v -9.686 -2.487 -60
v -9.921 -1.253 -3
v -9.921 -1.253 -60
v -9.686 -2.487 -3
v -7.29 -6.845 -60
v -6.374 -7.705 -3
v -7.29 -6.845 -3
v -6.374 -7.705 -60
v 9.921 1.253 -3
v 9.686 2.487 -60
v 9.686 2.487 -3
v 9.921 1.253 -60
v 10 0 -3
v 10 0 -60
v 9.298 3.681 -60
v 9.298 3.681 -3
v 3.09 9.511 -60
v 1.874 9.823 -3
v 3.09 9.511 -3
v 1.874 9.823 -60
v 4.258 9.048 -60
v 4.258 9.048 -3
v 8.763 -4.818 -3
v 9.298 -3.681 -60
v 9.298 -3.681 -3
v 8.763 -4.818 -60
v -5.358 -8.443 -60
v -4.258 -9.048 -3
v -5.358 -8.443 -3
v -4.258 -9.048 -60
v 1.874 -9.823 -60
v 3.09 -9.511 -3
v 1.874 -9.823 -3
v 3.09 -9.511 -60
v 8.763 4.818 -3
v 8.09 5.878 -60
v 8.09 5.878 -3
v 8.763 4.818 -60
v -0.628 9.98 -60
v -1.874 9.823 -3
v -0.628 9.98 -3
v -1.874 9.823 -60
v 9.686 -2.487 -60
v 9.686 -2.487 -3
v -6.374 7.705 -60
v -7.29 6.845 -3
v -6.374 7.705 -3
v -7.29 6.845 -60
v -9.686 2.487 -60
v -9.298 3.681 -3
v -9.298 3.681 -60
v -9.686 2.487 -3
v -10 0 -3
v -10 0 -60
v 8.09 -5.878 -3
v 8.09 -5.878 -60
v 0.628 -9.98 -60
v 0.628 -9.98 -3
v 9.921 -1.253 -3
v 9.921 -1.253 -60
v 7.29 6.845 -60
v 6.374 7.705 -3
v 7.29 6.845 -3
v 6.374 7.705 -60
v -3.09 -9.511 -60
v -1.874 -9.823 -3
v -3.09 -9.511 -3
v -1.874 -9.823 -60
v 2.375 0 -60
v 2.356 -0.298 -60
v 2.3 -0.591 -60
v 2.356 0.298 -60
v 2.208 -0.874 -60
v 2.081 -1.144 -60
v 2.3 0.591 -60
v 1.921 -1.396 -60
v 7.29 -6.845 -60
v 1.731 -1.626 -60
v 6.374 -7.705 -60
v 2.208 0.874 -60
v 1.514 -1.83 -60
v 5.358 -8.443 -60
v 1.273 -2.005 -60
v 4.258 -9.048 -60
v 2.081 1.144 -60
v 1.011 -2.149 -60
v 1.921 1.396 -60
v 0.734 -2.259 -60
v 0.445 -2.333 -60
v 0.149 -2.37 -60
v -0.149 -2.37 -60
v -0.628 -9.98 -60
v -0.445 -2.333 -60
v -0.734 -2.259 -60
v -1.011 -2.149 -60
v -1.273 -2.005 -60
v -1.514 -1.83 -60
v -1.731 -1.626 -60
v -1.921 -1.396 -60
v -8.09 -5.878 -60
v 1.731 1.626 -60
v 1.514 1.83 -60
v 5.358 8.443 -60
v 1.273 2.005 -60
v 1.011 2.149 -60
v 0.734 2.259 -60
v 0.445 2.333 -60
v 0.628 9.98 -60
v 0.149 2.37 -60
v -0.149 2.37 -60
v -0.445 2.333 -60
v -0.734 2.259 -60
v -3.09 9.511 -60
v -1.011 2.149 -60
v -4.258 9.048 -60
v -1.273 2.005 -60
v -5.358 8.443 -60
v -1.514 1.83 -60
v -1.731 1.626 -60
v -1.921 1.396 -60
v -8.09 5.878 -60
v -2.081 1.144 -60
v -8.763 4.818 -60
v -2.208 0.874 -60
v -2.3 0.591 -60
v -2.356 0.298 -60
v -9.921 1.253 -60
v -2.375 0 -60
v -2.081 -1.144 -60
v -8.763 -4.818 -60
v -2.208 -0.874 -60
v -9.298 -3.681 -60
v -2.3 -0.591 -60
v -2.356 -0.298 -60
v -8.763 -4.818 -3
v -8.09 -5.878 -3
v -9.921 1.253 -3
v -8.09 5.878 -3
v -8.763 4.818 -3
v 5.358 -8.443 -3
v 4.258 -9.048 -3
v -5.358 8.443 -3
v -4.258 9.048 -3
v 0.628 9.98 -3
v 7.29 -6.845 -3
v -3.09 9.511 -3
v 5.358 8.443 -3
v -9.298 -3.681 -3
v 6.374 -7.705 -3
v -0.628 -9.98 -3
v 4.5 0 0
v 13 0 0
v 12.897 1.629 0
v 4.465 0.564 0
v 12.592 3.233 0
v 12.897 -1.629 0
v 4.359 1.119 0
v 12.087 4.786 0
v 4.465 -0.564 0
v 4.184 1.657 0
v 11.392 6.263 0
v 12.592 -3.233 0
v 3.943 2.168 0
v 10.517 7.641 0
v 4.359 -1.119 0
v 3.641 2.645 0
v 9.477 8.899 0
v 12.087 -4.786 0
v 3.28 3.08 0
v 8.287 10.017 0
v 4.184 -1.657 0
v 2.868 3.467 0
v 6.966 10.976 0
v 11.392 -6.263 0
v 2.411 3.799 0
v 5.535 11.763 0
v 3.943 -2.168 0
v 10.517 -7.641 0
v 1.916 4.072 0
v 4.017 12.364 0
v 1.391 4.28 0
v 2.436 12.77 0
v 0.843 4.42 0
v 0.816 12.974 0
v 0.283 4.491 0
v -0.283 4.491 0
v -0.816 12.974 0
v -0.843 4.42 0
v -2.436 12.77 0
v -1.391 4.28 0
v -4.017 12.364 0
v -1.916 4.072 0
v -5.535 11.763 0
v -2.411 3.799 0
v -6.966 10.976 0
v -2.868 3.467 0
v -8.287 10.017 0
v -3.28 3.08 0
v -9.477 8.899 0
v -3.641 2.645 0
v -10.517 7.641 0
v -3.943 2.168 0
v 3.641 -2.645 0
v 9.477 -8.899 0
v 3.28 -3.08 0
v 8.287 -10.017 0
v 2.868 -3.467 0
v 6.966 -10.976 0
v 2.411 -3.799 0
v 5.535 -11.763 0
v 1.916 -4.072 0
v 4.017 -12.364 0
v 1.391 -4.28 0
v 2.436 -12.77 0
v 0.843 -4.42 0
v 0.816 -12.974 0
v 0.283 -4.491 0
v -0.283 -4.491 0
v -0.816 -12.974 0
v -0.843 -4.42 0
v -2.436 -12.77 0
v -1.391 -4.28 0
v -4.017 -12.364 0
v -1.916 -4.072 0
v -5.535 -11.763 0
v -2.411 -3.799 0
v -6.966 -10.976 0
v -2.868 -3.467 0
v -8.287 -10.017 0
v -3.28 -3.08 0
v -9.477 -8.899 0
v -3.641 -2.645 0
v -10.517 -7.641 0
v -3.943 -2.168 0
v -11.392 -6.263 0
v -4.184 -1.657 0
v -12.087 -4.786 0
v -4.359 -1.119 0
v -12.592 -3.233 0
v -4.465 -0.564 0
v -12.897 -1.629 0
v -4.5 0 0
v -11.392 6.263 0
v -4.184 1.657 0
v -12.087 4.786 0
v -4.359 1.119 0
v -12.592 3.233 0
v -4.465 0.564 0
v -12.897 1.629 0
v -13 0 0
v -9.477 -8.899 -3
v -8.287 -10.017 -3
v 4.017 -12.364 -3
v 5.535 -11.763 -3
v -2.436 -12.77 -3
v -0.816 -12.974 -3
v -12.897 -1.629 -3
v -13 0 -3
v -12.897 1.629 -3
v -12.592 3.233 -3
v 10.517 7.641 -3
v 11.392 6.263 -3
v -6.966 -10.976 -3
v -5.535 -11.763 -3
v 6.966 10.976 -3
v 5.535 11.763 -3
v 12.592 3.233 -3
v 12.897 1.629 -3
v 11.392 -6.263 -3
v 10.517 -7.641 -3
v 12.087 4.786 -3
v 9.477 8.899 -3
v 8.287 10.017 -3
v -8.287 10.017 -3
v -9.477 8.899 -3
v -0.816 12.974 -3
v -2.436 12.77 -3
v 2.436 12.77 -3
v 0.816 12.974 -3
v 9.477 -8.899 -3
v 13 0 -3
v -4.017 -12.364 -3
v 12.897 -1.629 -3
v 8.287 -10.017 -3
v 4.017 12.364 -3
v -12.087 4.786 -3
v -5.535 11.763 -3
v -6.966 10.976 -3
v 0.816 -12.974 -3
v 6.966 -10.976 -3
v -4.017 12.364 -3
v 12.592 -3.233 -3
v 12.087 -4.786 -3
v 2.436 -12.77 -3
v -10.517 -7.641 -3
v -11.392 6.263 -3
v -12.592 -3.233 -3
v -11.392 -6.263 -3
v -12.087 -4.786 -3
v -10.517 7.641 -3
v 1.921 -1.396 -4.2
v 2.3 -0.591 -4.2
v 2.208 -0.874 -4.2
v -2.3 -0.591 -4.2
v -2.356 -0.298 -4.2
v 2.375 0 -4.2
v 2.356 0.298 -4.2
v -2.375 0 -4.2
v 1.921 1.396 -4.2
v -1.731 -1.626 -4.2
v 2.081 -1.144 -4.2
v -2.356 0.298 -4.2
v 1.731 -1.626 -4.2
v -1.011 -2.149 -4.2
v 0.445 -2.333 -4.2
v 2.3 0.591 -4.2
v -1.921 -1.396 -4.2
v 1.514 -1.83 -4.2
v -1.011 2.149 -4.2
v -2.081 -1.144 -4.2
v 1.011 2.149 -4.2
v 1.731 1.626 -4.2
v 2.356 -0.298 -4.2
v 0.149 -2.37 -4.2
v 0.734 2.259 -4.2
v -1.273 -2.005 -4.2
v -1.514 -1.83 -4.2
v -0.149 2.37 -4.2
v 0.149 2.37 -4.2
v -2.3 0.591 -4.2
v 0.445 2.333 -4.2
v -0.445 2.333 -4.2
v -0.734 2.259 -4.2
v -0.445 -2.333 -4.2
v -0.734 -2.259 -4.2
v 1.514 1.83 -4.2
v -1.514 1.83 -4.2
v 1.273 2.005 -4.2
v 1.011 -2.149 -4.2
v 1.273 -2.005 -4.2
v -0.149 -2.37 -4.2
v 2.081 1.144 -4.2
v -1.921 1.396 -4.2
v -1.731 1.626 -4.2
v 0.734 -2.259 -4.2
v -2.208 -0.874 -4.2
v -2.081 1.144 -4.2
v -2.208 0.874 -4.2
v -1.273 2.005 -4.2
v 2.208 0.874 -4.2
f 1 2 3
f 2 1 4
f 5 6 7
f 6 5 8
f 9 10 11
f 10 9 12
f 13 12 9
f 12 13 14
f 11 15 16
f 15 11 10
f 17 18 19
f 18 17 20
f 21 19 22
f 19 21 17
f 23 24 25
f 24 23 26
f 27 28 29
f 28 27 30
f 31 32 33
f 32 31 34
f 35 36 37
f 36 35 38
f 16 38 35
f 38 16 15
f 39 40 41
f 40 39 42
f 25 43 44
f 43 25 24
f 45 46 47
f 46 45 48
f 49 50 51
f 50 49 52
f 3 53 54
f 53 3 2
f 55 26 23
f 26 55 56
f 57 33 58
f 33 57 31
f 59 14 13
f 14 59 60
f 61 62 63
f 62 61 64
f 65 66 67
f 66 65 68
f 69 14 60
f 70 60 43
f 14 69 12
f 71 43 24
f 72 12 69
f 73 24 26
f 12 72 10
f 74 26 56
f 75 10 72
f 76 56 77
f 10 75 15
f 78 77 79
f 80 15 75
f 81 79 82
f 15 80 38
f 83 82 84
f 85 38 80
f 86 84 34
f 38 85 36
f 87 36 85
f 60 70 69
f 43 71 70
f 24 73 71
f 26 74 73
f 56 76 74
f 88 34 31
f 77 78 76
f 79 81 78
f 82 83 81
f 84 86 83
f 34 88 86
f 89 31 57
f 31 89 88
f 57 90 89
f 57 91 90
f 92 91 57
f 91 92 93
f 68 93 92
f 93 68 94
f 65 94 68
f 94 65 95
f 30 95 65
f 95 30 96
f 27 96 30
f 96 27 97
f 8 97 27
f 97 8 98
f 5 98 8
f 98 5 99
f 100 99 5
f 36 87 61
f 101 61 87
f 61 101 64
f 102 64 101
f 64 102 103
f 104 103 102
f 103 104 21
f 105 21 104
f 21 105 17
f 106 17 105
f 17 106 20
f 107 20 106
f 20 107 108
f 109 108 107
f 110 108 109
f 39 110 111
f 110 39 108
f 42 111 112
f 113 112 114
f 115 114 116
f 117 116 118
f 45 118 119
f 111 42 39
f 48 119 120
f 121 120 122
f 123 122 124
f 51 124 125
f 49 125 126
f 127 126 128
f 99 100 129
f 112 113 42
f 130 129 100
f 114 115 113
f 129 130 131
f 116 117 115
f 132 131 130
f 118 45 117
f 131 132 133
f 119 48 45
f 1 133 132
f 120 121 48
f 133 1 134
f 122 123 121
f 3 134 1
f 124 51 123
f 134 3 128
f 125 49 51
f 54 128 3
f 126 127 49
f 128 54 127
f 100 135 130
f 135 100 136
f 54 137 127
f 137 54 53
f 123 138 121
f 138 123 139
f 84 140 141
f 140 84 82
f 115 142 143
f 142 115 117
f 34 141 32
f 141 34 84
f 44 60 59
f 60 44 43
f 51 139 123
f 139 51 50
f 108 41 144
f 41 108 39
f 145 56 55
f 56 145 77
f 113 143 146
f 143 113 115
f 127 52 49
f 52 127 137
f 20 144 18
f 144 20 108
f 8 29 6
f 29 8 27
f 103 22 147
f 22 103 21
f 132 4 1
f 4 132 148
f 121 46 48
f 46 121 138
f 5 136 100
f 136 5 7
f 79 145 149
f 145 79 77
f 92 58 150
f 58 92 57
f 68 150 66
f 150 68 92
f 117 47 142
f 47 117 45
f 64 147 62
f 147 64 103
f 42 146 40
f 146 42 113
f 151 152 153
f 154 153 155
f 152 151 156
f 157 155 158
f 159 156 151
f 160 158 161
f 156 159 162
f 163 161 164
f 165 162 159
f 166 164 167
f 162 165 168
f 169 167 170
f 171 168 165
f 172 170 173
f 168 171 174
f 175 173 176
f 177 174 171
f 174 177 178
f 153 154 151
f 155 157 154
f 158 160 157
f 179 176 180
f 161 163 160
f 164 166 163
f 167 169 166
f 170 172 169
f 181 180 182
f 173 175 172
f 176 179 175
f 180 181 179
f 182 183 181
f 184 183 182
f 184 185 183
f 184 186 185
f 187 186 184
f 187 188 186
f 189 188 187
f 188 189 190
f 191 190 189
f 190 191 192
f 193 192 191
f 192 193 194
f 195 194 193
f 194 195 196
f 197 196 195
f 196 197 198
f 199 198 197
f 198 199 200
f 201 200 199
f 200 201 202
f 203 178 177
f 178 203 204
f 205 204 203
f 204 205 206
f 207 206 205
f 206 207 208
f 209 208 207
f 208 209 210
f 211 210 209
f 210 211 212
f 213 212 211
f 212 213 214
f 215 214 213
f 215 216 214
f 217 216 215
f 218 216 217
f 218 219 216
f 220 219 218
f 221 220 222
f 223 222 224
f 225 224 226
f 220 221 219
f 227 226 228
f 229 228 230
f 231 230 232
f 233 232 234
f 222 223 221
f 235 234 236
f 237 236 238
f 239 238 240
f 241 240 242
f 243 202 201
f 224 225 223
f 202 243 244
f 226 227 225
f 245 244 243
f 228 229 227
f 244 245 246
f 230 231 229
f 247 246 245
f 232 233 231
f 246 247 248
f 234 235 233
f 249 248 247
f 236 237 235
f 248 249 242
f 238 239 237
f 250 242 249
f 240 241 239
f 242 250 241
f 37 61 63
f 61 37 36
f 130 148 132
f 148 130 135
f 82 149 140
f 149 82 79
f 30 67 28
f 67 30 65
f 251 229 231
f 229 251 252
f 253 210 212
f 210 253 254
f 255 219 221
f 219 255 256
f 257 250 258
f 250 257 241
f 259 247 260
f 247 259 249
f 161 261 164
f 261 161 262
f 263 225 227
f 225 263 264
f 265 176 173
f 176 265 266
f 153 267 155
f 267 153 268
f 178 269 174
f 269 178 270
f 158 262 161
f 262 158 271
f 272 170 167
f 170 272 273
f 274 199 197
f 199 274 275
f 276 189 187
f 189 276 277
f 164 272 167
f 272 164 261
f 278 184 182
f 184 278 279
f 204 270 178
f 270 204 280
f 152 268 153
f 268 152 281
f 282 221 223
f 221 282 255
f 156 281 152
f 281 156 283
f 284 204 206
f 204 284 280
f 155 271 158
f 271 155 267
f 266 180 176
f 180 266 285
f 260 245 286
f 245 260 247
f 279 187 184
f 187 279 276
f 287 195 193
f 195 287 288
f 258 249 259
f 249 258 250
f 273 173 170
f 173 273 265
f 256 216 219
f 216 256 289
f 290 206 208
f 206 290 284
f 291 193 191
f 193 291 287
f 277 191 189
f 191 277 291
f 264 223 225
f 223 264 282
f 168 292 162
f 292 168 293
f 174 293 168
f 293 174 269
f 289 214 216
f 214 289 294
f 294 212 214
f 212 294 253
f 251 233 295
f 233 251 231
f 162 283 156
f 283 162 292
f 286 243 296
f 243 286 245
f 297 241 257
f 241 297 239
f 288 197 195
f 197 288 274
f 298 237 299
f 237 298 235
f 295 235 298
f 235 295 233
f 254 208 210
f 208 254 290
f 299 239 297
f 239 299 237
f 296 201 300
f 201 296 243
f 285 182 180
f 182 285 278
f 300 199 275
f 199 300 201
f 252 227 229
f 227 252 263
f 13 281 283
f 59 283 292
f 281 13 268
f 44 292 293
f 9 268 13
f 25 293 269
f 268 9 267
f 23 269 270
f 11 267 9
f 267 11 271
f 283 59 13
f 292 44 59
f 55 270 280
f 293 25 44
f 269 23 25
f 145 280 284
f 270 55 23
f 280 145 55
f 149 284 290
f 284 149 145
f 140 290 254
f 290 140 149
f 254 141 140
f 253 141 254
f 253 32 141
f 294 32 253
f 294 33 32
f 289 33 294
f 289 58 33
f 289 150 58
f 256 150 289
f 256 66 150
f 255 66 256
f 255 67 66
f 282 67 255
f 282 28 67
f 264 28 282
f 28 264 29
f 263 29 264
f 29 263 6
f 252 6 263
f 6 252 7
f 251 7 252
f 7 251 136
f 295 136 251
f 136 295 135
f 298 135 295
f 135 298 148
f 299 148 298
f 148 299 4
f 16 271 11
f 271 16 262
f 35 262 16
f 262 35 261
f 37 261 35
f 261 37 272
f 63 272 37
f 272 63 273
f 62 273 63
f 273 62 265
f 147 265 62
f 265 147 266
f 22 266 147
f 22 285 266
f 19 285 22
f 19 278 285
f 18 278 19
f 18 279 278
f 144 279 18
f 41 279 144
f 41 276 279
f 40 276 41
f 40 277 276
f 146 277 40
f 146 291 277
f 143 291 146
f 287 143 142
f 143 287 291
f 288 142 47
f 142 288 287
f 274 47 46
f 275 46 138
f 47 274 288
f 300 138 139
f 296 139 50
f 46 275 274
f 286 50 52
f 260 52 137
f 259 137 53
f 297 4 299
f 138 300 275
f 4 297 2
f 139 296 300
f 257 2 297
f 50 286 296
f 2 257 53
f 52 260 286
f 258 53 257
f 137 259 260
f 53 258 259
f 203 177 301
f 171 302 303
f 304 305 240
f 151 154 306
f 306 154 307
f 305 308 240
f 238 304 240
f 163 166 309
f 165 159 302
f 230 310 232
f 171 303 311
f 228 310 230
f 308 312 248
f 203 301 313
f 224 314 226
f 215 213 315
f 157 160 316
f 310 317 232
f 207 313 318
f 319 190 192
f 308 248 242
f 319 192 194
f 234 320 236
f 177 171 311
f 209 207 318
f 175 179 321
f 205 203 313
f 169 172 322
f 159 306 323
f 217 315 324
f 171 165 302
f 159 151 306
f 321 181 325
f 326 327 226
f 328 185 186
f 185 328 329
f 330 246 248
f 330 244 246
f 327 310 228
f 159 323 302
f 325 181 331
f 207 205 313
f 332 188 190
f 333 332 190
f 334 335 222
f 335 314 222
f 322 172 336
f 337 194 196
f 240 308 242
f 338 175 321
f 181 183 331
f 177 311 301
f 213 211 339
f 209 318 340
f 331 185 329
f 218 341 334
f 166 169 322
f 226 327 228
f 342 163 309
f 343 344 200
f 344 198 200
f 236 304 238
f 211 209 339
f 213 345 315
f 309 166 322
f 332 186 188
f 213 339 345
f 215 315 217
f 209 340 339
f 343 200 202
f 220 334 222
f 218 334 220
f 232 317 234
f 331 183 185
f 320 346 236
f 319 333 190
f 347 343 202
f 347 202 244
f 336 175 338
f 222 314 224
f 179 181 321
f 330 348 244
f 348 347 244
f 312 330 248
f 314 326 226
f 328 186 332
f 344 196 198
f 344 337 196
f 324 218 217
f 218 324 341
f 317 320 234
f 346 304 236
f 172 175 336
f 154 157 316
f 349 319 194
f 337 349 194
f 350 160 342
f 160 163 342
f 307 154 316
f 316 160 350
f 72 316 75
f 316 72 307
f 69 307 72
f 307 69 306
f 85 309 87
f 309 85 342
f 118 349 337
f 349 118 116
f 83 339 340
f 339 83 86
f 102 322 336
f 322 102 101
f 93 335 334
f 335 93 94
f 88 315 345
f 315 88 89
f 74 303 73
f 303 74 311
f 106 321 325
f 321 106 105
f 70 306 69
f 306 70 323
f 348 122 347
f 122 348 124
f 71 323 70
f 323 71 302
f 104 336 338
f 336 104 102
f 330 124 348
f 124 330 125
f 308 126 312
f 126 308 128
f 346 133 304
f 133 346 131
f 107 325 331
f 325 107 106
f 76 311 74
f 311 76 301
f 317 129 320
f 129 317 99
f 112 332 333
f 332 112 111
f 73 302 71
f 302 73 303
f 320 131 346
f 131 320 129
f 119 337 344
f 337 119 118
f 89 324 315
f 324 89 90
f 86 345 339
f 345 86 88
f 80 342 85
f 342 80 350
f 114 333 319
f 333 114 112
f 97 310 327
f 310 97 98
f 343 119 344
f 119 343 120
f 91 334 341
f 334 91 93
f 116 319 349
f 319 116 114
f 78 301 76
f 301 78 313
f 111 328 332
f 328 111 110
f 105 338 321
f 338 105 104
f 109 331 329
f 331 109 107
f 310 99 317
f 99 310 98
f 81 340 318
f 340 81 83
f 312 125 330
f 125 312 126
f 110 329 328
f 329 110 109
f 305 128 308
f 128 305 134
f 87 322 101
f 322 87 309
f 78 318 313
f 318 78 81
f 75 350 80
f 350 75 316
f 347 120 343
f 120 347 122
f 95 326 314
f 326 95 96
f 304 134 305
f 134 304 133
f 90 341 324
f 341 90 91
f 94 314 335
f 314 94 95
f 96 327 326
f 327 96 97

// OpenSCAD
$fn = 50;


difference() {
	union() {
		translate(v = [0, 0, -60.0000000000]) {
			cylinder(h = 60, r = 10.0000000000);
		}
		translate(v = [0, 0, -3.0000000000]) {
			cylinder(h = 3, r = 13.0000000000);
		}
	}
	union() {
		translate(v = [0, 0, 0]) {
			rotate(a = [0, 0, 0]) {
				difference() {
					union() {
						#translate(v = [0, 0, -60.0000000000]) {
							cylinder(h = 60, r = 2.2500000000);
						}
						#translate(v = [0, 0, -4.2000000000]) {
							cylinder(h = 4.2000000000, r1 = 2.3750000000, r2 = 4.5000000000);
						}
						#translate(v = [0, 0, -60.0000000000]) {
							cylinder(h = 60, r = 2.3750000000);
						}
						#translate(v = [0, 0, -60.0000000000]) {
							cylinder(h = 60, r = 2.2500000000);
						}
					}
					union();
				}
			}
		}
	}
}
